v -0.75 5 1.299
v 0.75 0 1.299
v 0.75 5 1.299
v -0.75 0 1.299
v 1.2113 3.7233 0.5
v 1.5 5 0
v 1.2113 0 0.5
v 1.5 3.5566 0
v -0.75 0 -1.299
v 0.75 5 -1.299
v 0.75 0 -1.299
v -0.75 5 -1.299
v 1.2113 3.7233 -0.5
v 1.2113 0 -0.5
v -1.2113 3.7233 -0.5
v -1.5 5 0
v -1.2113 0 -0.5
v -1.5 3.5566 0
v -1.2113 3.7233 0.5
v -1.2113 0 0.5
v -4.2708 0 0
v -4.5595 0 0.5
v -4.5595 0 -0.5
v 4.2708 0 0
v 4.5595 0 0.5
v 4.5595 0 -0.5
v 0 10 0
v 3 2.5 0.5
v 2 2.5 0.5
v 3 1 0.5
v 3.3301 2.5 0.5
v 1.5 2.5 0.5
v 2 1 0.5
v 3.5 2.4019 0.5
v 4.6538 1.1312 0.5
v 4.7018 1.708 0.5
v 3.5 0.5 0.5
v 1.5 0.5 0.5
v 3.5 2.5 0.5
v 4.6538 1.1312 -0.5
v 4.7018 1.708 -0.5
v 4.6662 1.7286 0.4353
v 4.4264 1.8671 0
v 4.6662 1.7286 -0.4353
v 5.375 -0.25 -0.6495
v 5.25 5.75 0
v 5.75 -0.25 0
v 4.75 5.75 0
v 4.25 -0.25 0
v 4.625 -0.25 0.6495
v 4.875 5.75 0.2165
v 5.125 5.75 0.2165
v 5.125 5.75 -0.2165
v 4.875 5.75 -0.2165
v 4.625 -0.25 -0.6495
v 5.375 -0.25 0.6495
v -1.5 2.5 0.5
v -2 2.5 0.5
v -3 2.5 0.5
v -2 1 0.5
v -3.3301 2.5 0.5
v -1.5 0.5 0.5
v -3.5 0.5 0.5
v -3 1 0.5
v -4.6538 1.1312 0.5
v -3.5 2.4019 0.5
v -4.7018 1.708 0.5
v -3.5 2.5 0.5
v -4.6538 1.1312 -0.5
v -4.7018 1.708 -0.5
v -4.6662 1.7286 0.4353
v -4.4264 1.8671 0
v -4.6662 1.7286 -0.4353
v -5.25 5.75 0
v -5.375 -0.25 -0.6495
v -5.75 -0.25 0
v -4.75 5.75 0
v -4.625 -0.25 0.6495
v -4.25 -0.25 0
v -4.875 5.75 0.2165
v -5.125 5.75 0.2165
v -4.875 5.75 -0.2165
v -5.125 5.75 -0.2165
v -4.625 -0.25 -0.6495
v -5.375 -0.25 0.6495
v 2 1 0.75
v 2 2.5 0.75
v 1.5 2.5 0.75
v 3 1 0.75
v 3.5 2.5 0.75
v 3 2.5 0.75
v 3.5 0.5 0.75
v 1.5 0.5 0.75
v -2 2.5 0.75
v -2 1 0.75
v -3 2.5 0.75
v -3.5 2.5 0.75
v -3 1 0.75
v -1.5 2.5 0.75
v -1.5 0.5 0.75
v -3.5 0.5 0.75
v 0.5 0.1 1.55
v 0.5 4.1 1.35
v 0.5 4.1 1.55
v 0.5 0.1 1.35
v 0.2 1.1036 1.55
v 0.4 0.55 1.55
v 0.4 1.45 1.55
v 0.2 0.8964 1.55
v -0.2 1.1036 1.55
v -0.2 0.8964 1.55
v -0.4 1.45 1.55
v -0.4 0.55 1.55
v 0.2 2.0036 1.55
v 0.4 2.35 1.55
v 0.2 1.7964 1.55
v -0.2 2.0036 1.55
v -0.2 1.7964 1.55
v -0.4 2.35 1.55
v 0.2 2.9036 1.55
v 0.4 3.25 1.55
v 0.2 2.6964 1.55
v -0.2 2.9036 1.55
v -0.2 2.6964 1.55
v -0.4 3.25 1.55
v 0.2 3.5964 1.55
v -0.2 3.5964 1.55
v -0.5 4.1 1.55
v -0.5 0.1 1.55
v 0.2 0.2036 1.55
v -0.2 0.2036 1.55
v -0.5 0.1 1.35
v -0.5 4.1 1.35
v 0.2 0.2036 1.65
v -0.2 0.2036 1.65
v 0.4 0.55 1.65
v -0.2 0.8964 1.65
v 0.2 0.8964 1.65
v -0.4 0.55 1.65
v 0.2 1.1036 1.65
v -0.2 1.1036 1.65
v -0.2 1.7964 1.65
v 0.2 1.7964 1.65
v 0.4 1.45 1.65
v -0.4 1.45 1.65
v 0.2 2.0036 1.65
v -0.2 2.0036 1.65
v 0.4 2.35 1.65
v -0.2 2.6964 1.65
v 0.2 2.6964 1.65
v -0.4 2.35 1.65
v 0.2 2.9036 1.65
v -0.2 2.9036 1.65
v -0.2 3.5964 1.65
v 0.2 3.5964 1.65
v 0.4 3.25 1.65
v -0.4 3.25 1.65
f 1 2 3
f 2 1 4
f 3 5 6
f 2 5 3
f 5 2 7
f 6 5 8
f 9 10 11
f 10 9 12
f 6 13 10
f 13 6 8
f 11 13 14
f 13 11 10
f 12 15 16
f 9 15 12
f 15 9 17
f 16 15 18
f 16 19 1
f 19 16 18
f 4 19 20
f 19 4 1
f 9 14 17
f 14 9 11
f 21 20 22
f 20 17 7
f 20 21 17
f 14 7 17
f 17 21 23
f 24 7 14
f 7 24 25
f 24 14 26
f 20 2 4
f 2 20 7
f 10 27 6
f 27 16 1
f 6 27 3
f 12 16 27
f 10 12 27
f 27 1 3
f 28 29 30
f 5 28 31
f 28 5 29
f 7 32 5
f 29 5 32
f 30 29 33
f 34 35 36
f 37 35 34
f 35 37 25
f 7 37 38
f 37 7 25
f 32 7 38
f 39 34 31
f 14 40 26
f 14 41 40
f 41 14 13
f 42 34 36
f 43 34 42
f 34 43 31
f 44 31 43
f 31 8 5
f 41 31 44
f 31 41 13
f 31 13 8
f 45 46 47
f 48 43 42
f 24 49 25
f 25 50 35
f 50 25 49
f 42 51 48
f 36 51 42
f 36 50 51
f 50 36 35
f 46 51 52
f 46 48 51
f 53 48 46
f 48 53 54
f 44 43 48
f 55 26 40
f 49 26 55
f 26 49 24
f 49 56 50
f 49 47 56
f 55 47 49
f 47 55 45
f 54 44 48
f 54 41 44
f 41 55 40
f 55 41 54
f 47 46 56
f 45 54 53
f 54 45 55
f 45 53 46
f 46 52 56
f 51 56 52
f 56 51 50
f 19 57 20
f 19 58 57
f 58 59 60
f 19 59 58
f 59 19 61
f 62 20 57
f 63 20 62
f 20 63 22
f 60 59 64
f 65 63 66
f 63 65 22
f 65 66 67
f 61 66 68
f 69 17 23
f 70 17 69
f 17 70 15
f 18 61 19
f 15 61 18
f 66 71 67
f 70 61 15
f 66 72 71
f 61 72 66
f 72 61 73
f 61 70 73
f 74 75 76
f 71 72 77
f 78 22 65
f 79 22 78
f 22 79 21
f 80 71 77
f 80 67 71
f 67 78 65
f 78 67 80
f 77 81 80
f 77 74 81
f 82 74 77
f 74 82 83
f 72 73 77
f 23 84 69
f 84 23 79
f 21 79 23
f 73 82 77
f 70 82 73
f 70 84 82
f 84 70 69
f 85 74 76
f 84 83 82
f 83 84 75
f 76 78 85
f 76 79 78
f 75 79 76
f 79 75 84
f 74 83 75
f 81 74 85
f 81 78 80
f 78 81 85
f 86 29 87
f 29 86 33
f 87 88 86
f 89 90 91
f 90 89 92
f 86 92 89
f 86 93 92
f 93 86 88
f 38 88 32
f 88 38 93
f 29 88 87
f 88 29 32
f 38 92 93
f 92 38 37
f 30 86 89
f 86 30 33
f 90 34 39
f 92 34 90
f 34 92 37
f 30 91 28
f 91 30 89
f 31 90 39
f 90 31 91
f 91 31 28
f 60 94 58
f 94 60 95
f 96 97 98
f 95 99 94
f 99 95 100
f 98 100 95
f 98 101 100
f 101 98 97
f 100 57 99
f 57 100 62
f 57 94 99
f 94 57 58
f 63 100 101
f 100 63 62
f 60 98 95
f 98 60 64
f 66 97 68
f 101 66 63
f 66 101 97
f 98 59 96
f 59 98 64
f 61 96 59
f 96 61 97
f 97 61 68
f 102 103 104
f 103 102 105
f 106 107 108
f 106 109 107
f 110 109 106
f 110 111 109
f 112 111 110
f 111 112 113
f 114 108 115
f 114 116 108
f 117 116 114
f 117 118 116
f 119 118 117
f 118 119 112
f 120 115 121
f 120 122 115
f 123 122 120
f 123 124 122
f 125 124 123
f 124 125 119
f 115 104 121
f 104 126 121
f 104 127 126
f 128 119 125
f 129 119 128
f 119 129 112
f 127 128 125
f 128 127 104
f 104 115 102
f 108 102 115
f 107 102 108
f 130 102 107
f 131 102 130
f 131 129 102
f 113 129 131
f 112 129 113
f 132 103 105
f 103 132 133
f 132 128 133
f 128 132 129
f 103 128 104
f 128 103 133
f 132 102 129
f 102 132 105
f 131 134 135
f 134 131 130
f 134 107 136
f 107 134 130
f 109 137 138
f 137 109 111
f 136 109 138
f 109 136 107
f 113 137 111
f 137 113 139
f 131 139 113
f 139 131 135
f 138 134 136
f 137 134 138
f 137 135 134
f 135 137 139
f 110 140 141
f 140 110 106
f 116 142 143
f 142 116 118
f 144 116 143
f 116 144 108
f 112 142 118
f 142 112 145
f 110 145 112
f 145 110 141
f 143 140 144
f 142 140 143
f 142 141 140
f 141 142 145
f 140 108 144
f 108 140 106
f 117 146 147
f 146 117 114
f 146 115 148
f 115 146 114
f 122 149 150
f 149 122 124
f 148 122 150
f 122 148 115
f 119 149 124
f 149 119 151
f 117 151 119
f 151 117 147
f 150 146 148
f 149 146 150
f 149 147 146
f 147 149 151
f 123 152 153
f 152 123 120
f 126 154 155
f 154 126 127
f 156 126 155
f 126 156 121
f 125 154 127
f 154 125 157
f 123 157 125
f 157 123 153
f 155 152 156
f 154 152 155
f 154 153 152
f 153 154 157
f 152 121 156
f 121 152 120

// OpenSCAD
// hull
module hull() {
    rotate([-90, 0, 0]) {
        cylinder(h=5, d=3, $fn=6);
        translate([0, 0, 5]) {
            cylinder(h=5, d1=3, d2=0, $fn=6);
        }
    }
}

module wing() {
    difference() {
        translate([0, 0, -0.5]) {
            cube([5, 5, 1]);
        }
        translate([-1, 5, -1]) {
            rotate([0, 0, -30]) {
                cube([10, 10, 2]);
            }
        }
    }
    translate([5, -0.25, 0]) {
        rotate([-90, 0, 0]) {
            cylinder(h=6, d1=1.5, d2=0.5, $fn=6);
        }
    }
}

module body() {
    union() {
        hull();
        wing();
        
        mirror(v=[1, 0, 0]) {
            wing();
        }
    }
}

module magnet() {
    translate([1.5, 0.5, 0.5]) {
        union() {
            color("#A00C0C") {
                union() {
                    cube([0.5, 2, 0.25]);
                    cube([1, 0.5, 0.25]);
                }
            }
            color("#0C0CA0") {
                union() {
                    translate([1.5, 0, 0]) {
                        cube([0.5, 2, 0.25]);
                    }
                    translate([1, 0, 0]) {
                        cube([1, 0.5, 0.25]);
                    }
                }
            }
        }
    }
}

// battery panel
module batterypanel() {
    color("#0c0c0c") {
      translate([-0.5, 0.1, 1.35]) {
        cube([1, 4, 0.2]);
        }
    }
}

module chargeindicator(pos, col) {
    color(col) {
        translate([0, 0.55 + (pos*0.90), 1.55]) {
            cylinder(d=0.8, h=0.1, $fn=6);
        }
    }
}

body();
batterypanel();
chargeindicator(0, "#fffffa");
chargeindicator(1, "#fffffb");
chargeindicator(2, "#fffffc");
chargeindicator(3, "#fffffd");

magnet();
mirror(v=[1, 0, 0]) {
    magnet();
}
